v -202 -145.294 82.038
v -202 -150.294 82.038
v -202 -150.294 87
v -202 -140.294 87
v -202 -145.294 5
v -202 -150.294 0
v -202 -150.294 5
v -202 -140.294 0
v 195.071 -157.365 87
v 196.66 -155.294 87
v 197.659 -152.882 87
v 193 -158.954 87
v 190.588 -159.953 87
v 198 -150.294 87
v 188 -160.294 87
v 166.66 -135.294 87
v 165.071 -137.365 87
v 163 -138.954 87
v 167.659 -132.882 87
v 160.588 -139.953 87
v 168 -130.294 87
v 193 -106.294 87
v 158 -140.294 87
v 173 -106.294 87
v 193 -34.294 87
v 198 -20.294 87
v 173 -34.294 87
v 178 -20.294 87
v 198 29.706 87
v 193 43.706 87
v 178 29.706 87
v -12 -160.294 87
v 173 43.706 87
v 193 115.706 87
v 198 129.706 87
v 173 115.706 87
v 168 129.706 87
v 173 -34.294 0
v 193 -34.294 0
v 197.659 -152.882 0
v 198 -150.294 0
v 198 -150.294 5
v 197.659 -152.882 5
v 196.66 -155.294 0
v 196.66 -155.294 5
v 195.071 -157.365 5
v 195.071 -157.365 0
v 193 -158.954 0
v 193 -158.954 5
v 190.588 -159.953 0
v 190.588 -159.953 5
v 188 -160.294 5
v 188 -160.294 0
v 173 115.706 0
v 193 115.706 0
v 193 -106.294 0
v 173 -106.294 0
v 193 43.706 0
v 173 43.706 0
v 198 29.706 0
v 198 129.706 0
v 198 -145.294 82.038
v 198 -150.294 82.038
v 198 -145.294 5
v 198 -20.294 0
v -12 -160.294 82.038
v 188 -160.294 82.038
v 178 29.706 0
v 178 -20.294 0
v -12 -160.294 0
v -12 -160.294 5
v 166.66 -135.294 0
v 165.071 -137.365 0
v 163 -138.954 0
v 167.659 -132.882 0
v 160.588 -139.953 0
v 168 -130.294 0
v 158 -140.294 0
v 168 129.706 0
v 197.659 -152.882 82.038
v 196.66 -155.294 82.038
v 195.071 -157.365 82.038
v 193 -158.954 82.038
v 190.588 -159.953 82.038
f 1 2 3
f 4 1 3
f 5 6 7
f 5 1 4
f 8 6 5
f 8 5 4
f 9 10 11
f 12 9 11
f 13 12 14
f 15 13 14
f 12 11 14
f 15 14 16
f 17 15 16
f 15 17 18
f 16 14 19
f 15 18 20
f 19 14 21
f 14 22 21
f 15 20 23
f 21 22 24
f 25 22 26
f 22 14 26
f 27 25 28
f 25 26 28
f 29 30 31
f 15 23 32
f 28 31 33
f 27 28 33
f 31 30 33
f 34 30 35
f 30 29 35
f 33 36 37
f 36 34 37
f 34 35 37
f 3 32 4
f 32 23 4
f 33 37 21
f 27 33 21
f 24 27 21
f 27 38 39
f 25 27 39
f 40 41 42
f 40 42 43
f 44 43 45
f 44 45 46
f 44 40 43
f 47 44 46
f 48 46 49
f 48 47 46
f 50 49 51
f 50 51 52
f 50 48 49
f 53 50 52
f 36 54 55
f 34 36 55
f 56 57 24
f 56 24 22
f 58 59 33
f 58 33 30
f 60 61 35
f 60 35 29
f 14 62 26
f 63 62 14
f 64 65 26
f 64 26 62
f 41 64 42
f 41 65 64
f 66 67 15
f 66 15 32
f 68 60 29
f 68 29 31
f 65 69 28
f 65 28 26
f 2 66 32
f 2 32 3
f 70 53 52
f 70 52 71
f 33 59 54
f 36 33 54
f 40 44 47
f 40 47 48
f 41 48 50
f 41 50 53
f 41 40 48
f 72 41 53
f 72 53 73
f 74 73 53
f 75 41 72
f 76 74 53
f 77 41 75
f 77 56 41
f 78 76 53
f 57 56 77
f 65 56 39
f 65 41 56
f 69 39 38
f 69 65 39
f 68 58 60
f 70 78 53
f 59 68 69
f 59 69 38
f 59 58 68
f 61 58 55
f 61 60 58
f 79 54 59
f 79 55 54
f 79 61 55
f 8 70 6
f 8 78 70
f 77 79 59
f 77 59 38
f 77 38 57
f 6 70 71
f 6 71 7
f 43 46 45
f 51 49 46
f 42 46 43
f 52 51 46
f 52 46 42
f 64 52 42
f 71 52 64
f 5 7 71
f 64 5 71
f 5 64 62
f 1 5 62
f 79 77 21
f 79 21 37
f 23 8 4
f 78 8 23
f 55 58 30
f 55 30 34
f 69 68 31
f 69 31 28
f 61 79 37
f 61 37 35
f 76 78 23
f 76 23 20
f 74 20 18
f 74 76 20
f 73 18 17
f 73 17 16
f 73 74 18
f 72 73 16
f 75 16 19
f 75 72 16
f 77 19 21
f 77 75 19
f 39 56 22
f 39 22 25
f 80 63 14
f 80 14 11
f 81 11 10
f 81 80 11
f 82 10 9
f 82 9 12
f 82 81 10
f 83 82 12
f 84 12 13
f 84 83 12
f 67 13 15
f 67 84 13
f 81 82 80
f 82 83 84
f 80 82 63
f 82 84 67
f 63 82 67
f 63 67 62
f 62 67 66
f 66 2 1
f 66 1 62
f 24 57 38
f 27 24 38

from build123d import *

# Parameters (mm, degrees)
SKETCH1_W           = 20
SKETCH1_H           = 72
BOSS_EXTRUDE2_DEPTH = 87
SKETCH2_W           = 77.037941343
SKETCH2_H           = 18.412852551
CUT_EXTRUDE1_DEPTH  = 420


with BuildPart() as part:
    # Sketch1 → Boss-Extrude2 (new body)
    with BuildSketch(Plane.XY):
        with BuildLine():
            Line((-202, -150.294090379), (-202, -140.294090379))
            Line((-202, -140.294090379), (148, -140.294090379))
            Line((148, -140.294090379), (158, -140.294090379))
            ThreePointArc((158, -140.294090379), (165.071067812, -137.36515819), (168, -130.294090379))
            Line((168, -130.294090379), (168, 129.705909621))
            Line((168, 129.705909621), (198, 129.705909621))
            Line((198, 129.705909621), (198, 29.705909621))
            Line((198, 29.705909621), (178, 29.705909621))
            Line((178, 29.705909621), (178, -20.294090379))
            Line((178, -20.294090379), (198, -20.294090379))
            Line((198, -20.294090379), (198, -150.294090379))
            ThreePointArc((198, -150.294090379), (195.071067812, -157.36515819), (188, -160.294090379))
            Line((188, -160.294090379), (-12, -160.294090379))
            Line((-12, -160.294090379), (-202, -150.294090379))
        make_face()
        with Locations((183, -70.294090379)):
            Rectangle(SKETCH1_W, SKETCH1_H, mode=Mode.SUBTRACT)
        with Locations((183, 79.705909621)):
            Rectangle(SKETCH1_W, SKETCH1_H, mode=Mode.SUBTRACT)
    extrude(amount=BOSS_EXTRUDE2_DEPTH)

    # Sketch2 → Cut-Extrude1 (cut)
    with BuildSketch(Plane.ZY.offset(202)):
        with Locations((43.518970671, -154.500516655)):
            Rectangle(SKETCH2_W, SKETCH2_H)
    extrude(amount=-CUT_EXTRUDE1_DEPTH, mode=Mode.SUBTRACT)


solid = part.part
